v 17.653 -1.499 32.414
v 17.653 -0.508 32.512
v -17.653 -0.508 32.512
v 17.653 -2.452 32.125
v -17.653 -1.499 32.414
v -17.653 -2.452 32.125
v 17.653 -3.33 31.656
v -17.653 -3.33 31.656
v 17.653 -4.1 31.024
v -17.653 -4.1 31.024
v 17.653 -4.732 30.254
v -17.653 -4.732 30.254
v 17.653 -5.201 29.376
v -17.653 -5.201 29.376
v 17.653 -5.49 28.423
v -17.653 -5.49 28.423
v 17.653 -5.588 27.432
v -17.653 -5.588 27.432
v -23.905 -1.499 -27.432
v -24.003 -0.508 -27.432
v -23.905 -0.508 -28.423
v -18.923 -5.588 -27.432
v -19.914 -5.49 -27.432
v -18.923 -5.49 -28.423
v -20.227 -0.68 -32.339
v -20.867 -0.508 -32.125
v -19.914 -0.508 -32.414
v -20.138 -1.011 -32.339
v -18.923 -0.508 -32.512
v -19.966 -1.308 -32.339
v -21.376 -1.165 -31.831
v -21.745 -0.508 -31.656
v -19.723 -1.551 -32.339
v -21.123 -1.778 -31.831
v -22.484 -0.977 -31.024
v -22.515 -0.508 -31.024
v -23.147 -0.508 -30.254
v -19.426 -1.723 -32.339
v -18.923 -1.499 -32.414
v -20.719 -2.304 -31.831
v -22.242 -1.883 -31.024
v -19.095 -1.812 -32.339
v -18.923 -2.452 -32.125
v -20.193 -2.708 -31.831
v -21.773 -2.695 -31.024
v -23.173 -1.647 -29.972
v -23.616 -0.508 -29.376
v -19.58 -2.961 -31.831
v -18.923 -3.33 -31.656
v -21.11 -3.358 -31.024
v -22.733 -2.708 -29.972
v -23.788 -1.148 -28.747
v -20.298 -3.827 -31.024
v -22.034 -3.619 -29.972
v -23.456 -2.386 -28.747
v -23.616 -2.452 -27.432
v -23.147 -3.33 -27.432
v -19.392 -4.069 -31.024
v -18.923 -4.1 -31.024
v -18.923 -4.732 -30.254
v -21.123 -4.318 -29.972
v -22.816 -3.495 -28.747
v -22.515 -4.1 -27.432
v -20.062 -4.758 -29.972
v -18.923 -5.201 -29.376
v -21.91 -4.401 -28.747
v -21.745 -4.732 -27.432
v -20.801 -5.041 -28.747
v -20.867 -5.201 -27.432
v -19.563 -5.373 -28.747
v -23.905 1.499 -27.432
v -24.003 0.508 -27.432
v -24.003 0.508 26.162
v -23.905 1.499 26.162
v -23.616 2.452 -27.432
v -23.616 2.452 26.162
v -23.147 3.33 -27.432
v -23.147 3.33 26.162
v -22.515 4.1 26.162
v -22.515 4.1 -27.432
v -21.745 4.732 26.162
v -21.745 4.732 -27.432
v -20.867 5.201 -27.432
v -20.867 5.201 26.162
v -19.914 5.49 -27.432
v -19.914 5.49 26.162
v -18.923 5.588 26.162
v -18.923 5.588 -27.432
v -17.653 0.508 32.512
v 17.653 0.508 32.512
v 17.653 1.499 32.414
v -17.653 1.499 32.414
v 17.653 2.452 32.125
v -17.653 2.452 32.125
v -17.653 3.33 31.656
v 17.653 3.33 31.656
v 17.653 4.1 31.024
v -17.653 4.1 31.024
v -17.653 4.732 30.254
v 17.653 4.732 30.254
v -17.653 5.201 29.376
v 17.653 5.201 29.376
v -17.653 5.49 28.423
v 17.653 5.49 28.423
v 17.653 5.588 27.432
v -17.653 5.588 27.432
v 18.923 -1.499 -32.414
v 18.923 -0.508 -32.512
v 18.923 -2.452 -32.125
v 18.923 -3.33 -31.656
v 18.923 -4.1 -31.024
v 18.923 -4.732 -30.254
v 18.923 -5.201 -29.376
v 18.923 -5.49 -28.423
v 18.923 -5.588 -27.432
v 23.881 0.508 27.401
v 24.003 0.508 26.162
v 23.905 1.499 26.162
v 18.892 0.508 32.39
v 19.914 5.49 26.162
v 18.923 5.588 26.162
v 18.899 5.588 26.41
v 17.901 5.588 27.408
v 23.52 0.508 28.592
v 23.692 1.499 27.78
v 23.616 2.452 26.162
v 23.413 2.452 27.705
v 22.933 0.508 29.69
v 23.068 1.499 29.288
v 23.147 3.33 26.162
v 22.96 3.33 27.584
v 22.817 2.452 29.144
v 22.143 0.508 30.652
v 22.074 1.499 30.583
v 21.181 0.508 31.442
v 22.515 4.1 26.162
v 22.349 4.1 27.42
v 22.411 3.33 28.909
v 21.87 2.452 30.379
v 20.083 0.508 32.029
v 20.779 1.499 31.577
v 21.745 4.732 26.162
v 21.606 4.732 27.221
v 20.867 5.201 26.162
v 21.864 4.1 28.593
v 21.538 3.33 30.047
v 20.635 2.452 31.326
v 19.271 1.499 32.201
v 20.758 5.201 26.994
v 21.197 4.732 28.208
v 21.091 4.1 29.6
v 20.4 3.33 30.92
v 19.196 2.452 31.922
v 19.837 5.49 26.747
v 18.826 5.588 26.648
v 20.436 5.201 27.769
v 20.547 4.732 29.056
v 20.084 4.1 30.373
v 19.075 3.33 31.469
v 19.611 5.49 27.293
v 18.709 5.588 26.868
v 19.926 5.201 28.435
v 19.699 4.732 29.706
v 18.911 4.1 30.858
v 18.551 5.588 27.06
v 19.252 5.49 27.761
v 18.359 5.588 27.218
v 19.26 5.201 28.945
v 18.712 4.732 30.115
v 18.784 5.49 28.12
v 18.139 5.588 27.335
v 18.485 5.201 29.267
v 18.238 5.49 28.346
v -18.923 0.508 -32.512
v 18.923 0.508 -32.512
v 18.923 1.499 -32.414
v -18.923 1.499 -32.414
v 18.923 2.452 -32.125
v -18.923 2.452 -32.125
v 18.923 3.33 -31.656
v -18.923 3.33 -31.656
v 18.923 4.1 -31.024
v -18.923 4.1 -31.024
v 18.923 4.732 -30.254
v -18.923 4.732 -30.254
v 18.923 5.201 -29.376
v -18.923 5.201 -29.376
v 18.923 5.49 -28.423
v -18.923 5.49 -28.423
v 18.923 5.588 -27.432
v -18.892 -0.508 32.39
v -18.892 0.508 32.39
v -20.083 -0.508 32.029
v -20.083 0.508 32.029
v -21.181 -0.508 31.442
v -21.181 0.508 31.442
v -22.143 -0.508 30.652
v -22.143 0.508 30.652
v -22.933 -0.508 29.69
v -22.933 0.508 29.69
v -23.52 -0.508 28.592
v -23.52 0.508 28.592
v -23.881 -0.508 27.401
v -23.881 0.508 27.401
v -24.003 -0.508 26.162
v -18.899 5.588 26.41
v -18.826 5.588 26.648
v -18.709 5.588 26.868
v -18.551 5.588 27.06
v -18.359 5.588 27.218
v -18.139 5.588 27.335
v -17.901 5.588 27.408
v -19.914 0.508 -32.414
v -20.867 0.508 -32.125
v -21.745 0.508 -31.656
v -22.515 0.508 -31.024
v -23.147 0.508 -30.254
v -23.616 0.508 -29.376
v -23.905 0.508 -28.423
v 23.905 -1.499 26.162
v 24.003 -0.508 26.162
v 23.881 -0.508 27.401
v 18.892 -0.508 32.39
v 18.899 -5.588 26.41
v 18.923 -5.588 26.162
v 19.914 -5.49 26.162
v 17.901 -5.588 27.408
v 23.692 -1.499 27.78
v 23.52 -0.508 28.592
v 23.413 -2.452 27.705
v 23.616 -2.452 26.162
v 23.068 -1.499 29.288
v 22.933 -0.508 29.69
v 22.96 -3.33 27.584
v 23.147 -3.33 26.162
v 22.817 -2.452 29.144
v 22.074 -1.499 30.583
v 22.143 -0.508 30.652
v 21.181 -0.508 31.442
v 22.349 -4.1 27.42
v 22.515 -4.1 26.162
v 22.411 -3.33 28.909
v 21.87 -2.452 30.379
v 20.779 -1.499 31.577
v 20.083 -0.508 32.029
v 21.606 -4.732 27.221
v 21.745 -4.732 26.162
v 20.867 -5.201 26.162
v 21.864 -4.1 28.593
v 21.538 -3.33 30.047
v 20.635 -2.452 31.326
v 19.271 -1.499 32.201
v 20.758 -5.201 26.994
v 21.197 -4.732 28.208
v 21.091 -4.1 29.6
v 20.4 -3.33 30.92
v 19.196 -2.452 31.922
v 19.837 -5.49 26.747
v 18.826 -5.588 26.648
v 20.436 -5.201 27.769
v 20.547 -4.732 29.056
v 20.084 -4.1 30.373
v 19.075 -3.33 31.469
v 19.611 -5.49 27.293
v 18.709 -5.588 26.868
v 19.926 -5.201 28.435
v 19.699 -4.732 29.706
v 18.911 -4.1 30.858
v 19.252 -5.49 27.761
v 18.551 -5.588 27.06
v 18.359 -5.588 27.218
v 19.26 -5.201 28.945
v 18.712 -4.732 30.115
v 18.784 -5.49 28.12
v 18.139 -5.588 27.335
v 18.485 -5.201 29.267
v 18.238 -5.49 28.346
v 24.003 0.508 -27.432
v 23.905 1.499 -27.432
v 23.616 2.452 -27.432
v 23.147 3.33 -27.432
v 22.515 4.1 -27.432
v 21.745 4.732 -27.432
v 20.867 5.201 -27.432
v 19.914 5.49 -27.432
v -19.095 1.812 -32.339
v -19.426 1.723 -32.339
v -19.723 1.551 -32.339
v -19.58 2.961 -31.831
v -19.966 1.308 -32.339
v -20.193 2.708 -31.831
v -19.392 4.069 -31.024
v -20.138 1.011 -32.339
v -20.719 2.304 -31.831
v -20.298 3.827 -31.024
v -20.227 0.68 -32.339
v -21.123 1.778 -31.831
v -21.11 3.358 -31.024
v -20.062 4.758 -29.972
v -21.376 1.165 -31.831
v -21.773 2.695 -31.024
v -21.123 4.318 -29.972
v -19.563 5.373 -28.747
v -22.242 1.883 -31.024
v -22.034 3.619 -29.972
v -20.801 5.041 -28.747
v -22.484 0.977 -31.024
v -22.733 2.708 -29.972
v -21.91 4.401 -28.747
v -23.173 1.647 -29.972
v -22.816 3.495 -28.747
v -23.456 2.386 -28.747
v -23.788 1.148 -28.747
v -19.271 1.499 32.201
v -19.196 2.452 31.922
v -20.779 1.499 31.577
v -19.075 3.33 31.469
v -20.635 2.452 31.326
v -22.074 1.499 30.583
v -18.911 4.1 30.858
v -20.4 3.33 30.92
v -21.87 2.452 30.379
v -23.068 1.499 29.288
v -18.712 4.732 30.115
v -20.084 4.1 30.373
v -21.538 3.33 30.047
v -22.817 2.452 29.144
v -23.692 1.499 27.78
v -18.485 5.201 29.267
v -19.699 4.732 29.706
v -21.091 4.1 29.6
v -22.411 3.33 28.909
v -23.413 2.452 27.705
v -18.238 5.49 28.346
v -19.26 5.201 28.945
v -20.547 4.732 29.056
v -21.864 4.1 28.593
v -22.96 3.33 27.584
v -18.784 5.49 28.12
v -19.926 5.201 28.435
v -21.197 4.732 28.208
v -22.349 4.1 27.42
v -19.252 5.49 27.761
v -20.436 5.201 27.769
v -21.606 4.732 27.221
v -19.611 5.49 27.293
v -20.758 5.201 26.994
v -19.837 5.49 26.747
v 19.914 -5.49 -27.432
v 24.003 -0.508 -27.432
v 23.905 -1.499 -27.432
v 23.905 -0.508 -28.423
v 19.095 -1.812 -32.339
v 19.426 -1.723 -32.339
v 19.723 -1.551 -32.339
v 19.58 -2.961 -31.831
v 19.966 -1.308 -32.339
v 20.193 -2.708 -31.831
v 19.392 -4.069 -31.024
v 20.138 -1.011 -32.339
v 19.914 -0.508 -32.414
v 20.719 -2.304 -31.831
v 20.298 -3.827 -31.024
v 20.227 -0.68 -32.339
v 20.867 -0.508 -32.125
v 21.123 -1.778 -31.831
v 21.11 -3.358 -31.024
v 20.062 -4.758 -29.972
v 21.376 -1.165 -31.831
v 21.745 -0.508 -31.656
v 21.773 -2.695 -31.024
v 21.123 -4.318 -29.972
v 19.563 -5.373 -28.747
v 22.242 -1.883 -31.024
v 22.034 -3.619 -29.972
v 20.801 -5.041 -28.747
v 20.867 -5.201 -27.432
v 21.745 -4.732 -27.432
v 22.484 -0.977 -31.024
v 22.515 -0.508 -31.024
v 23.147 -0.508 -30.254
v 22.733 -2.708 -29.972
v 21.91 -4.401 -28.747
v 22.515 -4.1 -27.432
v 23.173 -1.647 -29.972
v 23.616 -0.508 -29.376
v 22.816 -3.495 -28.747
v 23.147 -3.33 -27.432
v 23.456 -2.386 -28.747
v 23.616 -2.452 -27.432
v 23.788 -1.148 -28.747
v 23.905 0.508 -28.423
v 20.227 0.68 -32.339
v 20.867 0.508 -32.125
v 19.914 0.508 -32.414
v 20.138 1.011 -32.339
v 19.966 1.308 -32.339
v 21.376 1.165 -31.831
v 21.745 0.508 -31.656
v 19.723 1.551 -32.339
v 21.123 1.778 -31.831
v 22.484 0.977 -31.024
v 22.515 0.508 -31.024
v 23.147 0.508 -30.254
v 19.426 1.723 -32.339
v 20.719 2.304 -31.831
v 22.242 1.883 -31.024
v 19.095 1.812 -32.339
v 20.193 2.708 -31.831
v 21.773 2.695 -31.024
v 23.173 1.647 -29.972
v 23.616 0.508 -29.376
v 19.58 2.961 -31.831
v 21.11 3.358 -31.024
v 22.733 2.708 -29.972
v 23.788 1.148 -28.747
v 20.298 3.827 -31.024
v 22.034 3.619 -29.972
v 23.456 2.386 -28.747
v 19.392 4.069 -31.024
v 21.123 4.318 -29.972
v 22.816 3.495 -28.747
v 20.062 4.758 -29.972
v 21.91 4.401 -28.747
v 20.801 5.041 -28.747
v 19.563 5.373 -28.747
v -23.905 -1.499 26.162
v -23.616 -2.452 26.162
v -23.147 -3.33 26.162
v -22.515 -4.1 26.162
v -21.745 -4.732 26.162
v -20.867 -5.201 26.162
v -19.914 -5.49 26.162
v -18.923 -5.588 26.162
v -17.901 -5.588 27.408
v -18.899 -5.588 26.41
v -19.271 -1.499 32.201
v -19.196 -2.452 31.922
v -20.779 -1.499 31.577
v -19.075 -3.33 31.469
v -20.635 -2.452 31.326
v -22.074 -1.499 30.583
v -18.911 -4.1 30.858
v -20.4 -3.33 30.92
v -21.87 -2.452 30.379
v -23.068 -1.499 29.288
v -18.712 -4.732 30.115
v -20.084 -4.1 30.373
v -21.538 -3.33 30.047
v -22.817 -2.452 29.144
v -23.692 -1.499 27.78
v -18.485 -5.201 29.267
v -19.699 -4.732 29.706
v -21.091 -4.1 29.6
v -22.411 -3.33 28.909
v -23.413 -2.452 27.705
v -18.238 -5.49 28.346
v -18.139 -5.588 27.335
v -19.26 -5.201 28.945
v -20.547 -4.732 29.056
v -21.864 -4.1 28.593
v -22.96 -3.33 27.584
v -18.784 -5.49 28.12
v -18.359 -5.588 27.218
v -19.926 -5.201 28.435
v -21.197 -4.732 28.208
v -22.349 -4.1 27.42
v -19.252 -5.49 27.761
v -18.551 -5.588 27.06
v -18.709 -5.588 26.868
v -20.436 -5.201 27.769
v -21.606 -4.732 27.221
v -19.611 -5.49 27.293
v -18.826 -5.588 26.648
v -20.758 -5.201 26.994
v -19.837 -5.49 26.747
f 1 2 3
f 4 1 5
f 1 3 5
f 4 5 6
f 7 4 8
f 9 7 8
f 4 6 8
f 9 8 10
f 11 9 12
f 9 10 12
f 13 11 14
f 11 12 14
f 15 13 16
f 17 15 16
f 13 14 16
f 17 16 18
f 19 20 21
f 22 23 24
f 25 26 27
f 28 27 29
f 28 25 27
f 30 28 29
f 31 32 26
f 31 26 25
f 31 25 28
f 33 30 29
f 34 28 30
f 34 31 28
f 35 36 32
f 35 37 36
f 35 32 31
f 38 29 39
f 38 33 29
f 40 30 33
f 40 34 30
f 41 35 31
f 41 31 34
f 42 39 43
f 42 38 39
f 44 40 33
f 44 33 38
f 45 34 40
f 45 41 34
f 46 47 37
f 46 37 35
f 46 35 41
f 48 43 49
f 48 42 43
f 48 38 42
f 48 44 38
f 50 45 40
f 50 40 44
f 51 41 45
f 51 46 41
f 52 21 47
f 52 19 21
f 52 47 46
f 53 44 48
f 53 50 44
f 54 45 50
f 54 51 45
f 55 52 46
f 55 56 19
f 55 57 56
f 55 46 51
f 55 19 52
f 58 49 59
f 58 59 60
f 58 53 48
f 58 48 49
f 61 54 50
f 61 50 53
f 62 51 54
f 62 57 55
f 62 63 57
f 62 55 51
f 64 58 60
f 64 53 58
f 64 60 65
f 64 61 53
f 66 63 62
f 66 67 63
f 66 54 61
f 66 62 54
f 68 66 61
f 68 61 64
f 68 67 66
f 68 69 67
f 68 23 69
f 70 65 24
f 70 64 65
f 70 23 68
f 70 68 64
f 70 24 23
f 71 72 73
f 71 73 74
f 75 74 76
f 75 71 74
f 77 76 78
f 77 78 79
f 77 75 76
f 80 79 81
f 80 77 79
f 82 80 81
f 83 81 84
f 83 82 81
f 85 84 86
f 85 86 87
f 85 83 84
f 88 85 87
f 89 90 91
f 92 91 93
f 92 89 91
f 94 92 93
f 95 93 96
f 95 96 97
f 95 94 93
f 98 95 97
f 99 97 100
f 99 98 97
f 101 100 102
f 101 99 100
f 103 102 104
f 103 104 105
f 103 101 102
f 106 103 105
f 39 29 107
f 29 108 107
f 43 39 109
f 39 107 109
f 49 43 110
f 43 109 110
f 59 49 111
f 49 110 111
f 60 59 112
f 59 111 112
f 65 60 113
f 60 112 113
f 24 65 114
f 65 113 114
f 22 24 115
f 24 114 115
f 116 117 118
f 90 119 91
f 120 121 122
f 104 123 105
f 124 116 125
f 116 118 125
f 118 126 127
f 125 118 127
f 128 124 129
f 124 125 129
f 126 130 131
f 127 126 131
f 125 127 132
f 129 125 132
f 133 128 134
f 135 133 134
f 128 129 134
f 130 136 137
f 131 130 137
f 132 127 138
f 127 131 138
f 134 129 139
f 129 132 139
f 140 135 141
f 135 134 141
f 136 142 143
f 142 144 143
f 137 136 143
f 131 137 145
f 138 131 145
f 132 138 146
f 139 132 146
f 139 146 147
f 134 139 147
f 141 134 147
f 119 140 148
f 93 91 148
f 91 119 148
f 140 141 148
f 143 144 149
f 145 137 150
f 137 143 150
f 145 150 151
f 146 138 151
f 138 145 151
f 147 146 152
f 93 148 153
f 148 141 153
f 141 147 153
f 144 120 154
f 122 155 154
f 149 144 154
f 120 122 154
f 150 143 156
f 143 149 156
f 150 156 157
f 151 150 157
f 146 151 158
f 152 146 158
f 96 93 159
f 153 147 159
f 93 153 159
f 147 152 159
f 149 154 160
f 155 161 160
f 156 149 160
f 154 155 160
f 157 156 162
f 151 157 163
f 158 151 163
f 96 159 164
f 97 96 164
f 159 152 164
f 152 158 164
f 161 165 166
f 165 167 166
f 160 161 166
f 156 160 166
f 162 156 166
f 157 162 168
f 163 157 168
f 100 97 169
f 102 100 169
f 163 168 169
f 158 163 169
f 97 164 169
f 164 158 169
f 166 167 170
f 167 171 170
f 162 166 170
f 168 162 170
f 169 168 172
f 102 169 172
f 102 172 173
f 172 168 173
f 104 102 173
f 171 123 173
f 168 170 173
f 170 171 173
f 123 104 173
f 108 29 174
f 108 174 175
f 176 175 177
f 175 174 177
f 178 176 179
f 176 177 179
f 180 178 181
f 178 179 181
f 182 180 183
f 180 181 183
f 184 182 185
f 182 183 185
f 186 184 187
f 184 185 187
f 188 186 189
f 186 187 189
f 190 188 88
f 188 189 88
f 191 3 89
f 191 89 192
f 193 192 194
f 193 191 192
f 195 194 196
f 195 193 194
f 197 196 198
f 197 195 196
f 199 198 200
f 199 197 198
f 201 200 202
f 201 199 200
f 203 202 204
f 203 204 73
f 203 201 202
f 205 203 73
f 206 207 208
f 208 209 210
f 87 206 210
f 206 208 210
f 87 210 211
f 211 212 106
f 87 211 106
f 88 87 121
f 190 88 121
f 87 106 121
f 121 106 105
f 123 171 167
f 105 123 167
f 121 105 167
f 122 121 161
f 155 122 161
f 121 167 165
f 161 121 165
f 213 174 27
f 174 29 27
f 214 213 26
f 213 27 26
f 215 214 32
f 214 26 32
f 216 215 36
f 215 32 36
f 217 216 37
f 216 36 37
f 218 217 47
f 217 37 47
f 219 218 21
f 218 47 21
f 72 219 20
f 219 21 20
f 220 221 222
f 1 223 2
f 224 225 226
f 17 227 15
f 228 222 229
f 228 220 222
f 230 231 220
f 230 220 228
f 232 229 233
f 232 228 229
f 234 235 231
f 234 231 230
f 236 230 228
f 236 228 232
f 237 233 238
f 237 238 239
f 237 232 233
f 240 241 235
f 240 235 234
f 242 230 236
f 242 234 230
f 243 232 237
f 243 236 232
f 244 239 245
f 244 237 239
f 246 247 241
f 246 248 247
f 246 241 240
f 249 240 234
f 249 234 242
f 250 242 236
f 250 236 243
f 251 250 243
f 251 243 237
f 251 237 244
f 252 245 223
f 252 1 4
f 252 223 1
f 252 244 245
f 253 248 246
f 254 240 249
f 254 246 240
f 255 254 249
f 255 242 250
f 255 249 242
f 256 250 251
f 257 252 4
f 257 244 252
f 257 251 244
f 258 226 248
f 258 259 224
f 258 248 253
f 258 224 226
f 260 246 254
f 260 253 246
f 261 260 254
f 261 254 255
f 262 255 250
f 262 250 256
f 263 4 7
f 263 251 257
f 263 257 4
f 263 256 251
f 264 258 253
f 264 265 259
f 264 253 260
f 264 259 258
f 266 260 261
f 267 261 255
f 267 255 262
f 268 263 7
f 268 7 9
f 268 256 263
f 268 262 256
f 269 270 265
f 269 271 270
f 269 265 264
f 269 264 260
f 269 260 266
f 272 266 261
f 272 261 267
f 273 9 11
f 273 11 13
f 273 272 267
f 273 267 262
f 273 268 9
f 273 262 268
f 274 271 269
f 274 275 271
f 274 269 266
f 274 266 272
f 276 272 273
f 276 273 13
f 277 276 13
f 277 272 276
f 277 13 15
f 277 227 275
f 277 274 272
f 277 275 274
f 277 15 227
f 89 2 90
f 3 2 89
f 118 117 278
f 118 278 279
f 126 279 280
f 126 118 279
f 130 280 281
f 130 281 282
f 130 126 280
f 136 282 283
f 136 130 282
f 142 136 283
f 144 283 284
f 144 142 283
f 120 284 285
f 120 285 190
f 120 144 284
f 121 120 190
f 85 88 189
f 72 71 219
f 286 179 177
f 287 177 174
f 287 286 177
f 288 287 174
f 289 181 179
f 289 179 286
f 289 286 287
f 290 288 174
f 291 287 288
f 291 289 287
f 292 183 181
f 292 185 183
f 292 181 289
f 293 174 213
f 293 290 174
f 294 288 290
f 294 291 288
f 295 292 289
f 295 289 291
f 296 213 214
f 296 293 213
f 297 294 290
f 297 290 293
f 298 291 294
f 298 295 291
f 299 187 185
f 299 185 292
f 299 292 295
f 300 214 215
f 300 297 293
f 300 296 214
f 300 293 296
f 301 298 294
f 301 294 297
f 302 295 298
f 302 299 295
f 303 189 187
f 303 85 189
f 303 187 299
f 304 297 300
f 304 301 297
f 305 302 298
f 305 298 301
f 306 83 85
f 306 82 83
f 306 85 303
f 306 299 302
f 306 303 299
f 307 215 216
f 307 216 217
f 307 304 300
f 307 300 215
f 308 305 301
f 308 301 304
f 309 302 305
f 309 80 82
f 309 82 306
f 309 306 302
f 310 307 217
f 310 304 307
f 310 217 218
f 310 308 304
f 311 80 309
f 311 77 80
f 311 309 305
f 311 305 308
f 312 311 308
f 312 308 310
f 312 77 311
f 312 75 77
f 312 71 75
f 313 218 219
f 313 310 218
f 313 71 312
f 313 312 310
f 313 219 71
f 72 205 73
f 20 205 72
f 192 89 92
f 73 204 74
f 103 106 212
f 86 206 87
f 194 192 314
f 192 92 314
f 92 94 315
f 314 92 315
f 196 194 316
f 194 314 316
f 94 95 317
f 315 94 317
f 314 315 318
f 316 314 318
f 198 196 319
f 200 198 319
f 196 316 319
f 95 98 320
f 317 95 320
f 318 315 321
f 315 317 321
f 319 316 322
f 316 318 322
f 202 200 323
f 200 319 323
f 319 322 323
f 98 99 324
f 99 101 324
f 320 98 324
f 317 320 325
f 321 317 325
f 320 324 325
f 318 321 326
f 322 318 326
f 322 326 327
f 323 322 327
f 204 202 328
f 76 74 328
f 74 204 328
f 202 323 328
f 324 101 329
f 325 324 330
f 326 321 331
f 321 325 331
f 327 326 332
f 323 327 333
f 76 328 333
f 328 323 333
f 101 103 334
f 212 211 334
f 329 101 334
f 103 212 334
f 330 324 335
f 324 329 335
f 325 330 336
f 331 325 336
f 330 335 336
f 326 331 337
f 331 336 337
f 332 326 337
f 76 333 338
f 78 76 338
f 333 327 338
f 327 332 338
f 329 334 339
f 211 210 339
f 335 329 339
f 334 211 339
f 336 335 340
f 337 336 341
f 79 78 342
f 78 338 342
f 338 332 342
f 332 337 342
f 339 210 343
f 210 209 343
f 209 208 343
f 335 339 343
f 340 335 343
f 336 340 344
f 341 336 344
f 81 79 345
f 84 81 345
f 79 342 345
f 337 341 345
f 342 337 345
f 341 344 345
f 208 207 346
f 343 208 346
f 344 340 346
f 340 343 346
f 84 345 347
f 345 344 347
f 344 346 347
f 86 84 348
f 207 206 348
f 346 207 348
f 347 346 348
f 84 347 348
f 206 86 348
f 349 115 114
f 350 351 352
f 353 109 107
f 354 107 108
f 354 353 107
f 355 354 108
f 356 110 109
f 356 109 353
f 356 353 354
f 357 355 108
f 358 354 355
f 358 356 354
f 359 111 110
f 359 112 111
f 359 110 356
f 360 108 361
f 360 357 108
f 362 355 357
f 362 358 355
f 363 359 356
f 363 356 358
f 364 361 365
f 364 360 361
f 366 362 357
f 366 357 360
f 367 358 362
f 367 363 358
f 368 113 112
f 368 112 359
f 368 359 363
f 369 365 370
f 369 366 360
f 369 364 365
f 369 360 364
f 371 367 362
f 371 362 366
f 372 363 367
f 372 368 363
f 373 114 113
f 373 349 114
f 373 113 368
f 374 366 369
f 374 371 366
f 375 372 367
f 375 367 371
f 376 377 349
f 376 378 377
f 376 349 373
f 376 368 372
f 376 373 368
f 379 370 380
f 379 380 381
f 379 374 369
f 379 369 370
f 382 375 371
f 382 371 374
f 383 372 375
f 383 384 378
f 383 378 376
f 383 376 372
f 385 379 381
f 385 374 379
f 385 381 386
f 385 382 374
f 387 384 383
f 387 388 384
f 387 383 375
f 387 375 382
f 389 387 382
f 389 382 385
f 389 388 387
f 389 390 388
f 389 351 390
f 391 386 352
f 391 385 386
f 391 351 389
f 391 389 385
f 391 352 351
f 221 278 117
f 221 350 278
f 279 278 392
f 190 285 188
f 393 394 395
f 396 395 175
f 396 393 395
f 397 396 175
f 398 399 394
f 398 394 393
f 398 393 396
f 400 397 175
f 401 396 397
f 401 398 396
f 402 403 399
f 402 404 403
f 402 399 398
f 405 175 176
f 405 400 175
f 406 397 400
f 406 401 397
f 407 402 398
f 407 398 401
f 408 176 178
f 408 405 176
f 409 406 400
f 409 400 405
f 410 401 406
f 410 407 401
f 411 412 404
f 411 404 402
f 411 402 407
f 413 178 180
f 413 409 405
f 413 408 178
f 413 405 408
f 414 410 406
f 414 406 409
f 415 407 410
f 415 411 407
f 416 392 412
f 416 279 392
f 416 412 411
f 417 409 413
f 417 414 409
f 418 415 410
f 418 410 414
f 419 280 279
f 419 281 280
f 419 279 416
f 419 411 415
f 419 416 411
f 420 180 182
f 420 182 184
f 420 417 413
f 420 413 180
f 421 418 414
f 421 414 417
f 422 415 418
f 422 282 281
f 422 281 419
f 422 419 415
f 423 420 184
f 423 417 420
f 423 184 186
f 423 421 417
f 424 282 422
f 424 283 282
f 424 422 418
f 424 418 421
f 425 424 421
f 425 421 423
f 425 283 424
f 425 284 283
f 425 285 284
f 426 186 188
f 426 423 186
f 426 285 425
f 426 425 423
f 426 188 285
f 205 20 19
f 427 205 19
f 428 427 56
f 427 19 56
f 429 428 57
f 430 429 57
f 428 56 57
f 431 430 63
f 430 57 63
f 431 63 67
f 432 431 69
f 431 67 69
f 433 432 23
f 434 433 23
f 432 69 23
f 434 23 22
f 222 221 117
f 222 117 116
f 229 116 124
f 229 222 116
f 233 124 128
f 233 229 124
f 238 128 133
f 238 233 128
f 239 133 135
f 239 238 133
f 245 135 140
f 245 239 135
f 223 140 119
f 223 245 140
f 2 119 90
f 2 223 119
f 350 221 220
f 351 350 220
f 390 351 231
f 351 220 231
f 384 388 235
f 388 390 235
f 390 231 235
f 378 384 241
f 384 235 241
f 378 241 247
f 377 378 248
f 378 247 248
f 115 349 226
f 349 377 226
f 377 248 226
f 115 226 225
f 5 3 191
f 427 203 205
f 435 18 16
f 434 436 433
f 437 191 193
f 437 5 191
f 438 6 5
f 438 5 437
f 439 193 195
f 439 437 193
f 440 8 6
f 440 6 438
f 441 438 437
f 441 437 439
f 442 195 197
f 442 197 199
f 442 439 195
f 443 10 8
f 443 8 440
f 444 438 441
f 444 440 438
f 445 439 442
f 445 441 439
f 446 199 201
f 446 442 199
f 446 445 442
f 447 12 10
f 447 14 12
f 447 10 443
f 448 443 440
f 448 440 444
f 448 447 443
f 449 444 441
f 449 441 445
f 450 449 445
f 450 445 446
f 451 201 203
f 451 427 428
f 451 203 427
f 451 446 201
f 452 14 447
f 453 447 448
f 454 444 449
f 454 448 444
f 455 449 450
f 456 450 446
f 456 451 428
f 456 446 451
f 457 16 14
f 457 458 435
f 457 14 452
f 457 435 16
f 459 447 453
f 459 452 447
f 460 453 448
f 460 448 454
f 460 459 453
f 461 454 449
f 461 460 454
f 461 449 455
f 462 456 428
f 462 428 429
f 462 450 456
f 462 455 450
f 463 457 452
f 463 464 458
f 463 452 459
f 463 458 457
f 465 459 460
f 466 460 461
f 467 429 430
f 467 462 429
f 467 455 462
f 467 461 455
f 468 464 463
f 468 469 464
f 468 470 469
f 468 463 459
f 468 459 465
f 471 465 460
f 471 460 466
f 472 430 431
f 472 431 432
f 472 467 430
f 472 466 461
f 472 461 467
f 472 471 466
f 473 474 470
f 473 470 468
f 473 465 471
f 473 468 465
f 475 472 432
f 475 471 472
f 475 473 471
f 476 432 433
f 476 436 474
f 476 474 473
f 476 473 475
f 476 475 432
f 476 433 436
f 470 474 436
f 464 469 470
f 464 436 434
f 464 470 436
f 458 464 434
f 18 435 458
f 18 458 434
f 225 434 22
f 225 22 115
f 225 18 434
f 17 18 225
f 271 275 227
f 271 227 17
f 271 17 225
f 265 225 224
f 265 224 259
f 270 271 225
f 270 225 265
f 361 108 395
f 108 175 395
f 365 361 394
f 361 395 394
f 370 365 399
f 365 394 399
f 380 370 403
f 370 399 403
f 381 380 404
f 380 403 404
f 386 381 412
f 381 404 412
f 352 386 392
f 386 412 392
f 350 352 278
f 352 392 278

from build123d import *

# Parameters (mm, degrees)
F1_DEPTH = 5.588
F2_R     = 5.08
F3_R     = 5.08


with BuildPart() as f1:
    # F0 (on Front) → F1 (new body, symmetric)
    with BuildSketch(Plane.XZ):
        with BuildLine():
            Line((-24.003, -32.512), (24.003, -32.512))
            Line((24.003, -32.512), (24.003, 26.162))
            ThreePointArc((24.003, 26.162), (22.1431280605, 30.6521280605), (17.653, 32.512))
            Line((17.653, 32.512), (-17.653, 32.512))
            ThreePointArc((-17.653, 32.512), (-22.1431280605, 30.6521280605), (-24.003, 26.162))
            Line((-24.003, 26.162), (-24.003, -32.512))
        make_face()
    extrude(amount=F1_DEPTH, both=True)

    # F2
    f2_edges = [f1.edges().sort_by_distance(p)[0] for p in [
        (-22.143128, 5.588, 30.652128),
        (-24.003, 0, 26.162),
        (-22.143128, -5.588, 30.652128),
        (-17.653, 0, 32.512),
    ]]
    fillet(f2_edges, radius=F2_R)

    # F3
    f3_edges = [f1.edges().sort_by_distance(p)[0] for p in [
        (-22.515102, -4.100102, -32.512),
        (22.515102, -4.100102, -32.512),
    ]]
    fillet(f3_edges, radius=F3_R)


solid = f1.part
